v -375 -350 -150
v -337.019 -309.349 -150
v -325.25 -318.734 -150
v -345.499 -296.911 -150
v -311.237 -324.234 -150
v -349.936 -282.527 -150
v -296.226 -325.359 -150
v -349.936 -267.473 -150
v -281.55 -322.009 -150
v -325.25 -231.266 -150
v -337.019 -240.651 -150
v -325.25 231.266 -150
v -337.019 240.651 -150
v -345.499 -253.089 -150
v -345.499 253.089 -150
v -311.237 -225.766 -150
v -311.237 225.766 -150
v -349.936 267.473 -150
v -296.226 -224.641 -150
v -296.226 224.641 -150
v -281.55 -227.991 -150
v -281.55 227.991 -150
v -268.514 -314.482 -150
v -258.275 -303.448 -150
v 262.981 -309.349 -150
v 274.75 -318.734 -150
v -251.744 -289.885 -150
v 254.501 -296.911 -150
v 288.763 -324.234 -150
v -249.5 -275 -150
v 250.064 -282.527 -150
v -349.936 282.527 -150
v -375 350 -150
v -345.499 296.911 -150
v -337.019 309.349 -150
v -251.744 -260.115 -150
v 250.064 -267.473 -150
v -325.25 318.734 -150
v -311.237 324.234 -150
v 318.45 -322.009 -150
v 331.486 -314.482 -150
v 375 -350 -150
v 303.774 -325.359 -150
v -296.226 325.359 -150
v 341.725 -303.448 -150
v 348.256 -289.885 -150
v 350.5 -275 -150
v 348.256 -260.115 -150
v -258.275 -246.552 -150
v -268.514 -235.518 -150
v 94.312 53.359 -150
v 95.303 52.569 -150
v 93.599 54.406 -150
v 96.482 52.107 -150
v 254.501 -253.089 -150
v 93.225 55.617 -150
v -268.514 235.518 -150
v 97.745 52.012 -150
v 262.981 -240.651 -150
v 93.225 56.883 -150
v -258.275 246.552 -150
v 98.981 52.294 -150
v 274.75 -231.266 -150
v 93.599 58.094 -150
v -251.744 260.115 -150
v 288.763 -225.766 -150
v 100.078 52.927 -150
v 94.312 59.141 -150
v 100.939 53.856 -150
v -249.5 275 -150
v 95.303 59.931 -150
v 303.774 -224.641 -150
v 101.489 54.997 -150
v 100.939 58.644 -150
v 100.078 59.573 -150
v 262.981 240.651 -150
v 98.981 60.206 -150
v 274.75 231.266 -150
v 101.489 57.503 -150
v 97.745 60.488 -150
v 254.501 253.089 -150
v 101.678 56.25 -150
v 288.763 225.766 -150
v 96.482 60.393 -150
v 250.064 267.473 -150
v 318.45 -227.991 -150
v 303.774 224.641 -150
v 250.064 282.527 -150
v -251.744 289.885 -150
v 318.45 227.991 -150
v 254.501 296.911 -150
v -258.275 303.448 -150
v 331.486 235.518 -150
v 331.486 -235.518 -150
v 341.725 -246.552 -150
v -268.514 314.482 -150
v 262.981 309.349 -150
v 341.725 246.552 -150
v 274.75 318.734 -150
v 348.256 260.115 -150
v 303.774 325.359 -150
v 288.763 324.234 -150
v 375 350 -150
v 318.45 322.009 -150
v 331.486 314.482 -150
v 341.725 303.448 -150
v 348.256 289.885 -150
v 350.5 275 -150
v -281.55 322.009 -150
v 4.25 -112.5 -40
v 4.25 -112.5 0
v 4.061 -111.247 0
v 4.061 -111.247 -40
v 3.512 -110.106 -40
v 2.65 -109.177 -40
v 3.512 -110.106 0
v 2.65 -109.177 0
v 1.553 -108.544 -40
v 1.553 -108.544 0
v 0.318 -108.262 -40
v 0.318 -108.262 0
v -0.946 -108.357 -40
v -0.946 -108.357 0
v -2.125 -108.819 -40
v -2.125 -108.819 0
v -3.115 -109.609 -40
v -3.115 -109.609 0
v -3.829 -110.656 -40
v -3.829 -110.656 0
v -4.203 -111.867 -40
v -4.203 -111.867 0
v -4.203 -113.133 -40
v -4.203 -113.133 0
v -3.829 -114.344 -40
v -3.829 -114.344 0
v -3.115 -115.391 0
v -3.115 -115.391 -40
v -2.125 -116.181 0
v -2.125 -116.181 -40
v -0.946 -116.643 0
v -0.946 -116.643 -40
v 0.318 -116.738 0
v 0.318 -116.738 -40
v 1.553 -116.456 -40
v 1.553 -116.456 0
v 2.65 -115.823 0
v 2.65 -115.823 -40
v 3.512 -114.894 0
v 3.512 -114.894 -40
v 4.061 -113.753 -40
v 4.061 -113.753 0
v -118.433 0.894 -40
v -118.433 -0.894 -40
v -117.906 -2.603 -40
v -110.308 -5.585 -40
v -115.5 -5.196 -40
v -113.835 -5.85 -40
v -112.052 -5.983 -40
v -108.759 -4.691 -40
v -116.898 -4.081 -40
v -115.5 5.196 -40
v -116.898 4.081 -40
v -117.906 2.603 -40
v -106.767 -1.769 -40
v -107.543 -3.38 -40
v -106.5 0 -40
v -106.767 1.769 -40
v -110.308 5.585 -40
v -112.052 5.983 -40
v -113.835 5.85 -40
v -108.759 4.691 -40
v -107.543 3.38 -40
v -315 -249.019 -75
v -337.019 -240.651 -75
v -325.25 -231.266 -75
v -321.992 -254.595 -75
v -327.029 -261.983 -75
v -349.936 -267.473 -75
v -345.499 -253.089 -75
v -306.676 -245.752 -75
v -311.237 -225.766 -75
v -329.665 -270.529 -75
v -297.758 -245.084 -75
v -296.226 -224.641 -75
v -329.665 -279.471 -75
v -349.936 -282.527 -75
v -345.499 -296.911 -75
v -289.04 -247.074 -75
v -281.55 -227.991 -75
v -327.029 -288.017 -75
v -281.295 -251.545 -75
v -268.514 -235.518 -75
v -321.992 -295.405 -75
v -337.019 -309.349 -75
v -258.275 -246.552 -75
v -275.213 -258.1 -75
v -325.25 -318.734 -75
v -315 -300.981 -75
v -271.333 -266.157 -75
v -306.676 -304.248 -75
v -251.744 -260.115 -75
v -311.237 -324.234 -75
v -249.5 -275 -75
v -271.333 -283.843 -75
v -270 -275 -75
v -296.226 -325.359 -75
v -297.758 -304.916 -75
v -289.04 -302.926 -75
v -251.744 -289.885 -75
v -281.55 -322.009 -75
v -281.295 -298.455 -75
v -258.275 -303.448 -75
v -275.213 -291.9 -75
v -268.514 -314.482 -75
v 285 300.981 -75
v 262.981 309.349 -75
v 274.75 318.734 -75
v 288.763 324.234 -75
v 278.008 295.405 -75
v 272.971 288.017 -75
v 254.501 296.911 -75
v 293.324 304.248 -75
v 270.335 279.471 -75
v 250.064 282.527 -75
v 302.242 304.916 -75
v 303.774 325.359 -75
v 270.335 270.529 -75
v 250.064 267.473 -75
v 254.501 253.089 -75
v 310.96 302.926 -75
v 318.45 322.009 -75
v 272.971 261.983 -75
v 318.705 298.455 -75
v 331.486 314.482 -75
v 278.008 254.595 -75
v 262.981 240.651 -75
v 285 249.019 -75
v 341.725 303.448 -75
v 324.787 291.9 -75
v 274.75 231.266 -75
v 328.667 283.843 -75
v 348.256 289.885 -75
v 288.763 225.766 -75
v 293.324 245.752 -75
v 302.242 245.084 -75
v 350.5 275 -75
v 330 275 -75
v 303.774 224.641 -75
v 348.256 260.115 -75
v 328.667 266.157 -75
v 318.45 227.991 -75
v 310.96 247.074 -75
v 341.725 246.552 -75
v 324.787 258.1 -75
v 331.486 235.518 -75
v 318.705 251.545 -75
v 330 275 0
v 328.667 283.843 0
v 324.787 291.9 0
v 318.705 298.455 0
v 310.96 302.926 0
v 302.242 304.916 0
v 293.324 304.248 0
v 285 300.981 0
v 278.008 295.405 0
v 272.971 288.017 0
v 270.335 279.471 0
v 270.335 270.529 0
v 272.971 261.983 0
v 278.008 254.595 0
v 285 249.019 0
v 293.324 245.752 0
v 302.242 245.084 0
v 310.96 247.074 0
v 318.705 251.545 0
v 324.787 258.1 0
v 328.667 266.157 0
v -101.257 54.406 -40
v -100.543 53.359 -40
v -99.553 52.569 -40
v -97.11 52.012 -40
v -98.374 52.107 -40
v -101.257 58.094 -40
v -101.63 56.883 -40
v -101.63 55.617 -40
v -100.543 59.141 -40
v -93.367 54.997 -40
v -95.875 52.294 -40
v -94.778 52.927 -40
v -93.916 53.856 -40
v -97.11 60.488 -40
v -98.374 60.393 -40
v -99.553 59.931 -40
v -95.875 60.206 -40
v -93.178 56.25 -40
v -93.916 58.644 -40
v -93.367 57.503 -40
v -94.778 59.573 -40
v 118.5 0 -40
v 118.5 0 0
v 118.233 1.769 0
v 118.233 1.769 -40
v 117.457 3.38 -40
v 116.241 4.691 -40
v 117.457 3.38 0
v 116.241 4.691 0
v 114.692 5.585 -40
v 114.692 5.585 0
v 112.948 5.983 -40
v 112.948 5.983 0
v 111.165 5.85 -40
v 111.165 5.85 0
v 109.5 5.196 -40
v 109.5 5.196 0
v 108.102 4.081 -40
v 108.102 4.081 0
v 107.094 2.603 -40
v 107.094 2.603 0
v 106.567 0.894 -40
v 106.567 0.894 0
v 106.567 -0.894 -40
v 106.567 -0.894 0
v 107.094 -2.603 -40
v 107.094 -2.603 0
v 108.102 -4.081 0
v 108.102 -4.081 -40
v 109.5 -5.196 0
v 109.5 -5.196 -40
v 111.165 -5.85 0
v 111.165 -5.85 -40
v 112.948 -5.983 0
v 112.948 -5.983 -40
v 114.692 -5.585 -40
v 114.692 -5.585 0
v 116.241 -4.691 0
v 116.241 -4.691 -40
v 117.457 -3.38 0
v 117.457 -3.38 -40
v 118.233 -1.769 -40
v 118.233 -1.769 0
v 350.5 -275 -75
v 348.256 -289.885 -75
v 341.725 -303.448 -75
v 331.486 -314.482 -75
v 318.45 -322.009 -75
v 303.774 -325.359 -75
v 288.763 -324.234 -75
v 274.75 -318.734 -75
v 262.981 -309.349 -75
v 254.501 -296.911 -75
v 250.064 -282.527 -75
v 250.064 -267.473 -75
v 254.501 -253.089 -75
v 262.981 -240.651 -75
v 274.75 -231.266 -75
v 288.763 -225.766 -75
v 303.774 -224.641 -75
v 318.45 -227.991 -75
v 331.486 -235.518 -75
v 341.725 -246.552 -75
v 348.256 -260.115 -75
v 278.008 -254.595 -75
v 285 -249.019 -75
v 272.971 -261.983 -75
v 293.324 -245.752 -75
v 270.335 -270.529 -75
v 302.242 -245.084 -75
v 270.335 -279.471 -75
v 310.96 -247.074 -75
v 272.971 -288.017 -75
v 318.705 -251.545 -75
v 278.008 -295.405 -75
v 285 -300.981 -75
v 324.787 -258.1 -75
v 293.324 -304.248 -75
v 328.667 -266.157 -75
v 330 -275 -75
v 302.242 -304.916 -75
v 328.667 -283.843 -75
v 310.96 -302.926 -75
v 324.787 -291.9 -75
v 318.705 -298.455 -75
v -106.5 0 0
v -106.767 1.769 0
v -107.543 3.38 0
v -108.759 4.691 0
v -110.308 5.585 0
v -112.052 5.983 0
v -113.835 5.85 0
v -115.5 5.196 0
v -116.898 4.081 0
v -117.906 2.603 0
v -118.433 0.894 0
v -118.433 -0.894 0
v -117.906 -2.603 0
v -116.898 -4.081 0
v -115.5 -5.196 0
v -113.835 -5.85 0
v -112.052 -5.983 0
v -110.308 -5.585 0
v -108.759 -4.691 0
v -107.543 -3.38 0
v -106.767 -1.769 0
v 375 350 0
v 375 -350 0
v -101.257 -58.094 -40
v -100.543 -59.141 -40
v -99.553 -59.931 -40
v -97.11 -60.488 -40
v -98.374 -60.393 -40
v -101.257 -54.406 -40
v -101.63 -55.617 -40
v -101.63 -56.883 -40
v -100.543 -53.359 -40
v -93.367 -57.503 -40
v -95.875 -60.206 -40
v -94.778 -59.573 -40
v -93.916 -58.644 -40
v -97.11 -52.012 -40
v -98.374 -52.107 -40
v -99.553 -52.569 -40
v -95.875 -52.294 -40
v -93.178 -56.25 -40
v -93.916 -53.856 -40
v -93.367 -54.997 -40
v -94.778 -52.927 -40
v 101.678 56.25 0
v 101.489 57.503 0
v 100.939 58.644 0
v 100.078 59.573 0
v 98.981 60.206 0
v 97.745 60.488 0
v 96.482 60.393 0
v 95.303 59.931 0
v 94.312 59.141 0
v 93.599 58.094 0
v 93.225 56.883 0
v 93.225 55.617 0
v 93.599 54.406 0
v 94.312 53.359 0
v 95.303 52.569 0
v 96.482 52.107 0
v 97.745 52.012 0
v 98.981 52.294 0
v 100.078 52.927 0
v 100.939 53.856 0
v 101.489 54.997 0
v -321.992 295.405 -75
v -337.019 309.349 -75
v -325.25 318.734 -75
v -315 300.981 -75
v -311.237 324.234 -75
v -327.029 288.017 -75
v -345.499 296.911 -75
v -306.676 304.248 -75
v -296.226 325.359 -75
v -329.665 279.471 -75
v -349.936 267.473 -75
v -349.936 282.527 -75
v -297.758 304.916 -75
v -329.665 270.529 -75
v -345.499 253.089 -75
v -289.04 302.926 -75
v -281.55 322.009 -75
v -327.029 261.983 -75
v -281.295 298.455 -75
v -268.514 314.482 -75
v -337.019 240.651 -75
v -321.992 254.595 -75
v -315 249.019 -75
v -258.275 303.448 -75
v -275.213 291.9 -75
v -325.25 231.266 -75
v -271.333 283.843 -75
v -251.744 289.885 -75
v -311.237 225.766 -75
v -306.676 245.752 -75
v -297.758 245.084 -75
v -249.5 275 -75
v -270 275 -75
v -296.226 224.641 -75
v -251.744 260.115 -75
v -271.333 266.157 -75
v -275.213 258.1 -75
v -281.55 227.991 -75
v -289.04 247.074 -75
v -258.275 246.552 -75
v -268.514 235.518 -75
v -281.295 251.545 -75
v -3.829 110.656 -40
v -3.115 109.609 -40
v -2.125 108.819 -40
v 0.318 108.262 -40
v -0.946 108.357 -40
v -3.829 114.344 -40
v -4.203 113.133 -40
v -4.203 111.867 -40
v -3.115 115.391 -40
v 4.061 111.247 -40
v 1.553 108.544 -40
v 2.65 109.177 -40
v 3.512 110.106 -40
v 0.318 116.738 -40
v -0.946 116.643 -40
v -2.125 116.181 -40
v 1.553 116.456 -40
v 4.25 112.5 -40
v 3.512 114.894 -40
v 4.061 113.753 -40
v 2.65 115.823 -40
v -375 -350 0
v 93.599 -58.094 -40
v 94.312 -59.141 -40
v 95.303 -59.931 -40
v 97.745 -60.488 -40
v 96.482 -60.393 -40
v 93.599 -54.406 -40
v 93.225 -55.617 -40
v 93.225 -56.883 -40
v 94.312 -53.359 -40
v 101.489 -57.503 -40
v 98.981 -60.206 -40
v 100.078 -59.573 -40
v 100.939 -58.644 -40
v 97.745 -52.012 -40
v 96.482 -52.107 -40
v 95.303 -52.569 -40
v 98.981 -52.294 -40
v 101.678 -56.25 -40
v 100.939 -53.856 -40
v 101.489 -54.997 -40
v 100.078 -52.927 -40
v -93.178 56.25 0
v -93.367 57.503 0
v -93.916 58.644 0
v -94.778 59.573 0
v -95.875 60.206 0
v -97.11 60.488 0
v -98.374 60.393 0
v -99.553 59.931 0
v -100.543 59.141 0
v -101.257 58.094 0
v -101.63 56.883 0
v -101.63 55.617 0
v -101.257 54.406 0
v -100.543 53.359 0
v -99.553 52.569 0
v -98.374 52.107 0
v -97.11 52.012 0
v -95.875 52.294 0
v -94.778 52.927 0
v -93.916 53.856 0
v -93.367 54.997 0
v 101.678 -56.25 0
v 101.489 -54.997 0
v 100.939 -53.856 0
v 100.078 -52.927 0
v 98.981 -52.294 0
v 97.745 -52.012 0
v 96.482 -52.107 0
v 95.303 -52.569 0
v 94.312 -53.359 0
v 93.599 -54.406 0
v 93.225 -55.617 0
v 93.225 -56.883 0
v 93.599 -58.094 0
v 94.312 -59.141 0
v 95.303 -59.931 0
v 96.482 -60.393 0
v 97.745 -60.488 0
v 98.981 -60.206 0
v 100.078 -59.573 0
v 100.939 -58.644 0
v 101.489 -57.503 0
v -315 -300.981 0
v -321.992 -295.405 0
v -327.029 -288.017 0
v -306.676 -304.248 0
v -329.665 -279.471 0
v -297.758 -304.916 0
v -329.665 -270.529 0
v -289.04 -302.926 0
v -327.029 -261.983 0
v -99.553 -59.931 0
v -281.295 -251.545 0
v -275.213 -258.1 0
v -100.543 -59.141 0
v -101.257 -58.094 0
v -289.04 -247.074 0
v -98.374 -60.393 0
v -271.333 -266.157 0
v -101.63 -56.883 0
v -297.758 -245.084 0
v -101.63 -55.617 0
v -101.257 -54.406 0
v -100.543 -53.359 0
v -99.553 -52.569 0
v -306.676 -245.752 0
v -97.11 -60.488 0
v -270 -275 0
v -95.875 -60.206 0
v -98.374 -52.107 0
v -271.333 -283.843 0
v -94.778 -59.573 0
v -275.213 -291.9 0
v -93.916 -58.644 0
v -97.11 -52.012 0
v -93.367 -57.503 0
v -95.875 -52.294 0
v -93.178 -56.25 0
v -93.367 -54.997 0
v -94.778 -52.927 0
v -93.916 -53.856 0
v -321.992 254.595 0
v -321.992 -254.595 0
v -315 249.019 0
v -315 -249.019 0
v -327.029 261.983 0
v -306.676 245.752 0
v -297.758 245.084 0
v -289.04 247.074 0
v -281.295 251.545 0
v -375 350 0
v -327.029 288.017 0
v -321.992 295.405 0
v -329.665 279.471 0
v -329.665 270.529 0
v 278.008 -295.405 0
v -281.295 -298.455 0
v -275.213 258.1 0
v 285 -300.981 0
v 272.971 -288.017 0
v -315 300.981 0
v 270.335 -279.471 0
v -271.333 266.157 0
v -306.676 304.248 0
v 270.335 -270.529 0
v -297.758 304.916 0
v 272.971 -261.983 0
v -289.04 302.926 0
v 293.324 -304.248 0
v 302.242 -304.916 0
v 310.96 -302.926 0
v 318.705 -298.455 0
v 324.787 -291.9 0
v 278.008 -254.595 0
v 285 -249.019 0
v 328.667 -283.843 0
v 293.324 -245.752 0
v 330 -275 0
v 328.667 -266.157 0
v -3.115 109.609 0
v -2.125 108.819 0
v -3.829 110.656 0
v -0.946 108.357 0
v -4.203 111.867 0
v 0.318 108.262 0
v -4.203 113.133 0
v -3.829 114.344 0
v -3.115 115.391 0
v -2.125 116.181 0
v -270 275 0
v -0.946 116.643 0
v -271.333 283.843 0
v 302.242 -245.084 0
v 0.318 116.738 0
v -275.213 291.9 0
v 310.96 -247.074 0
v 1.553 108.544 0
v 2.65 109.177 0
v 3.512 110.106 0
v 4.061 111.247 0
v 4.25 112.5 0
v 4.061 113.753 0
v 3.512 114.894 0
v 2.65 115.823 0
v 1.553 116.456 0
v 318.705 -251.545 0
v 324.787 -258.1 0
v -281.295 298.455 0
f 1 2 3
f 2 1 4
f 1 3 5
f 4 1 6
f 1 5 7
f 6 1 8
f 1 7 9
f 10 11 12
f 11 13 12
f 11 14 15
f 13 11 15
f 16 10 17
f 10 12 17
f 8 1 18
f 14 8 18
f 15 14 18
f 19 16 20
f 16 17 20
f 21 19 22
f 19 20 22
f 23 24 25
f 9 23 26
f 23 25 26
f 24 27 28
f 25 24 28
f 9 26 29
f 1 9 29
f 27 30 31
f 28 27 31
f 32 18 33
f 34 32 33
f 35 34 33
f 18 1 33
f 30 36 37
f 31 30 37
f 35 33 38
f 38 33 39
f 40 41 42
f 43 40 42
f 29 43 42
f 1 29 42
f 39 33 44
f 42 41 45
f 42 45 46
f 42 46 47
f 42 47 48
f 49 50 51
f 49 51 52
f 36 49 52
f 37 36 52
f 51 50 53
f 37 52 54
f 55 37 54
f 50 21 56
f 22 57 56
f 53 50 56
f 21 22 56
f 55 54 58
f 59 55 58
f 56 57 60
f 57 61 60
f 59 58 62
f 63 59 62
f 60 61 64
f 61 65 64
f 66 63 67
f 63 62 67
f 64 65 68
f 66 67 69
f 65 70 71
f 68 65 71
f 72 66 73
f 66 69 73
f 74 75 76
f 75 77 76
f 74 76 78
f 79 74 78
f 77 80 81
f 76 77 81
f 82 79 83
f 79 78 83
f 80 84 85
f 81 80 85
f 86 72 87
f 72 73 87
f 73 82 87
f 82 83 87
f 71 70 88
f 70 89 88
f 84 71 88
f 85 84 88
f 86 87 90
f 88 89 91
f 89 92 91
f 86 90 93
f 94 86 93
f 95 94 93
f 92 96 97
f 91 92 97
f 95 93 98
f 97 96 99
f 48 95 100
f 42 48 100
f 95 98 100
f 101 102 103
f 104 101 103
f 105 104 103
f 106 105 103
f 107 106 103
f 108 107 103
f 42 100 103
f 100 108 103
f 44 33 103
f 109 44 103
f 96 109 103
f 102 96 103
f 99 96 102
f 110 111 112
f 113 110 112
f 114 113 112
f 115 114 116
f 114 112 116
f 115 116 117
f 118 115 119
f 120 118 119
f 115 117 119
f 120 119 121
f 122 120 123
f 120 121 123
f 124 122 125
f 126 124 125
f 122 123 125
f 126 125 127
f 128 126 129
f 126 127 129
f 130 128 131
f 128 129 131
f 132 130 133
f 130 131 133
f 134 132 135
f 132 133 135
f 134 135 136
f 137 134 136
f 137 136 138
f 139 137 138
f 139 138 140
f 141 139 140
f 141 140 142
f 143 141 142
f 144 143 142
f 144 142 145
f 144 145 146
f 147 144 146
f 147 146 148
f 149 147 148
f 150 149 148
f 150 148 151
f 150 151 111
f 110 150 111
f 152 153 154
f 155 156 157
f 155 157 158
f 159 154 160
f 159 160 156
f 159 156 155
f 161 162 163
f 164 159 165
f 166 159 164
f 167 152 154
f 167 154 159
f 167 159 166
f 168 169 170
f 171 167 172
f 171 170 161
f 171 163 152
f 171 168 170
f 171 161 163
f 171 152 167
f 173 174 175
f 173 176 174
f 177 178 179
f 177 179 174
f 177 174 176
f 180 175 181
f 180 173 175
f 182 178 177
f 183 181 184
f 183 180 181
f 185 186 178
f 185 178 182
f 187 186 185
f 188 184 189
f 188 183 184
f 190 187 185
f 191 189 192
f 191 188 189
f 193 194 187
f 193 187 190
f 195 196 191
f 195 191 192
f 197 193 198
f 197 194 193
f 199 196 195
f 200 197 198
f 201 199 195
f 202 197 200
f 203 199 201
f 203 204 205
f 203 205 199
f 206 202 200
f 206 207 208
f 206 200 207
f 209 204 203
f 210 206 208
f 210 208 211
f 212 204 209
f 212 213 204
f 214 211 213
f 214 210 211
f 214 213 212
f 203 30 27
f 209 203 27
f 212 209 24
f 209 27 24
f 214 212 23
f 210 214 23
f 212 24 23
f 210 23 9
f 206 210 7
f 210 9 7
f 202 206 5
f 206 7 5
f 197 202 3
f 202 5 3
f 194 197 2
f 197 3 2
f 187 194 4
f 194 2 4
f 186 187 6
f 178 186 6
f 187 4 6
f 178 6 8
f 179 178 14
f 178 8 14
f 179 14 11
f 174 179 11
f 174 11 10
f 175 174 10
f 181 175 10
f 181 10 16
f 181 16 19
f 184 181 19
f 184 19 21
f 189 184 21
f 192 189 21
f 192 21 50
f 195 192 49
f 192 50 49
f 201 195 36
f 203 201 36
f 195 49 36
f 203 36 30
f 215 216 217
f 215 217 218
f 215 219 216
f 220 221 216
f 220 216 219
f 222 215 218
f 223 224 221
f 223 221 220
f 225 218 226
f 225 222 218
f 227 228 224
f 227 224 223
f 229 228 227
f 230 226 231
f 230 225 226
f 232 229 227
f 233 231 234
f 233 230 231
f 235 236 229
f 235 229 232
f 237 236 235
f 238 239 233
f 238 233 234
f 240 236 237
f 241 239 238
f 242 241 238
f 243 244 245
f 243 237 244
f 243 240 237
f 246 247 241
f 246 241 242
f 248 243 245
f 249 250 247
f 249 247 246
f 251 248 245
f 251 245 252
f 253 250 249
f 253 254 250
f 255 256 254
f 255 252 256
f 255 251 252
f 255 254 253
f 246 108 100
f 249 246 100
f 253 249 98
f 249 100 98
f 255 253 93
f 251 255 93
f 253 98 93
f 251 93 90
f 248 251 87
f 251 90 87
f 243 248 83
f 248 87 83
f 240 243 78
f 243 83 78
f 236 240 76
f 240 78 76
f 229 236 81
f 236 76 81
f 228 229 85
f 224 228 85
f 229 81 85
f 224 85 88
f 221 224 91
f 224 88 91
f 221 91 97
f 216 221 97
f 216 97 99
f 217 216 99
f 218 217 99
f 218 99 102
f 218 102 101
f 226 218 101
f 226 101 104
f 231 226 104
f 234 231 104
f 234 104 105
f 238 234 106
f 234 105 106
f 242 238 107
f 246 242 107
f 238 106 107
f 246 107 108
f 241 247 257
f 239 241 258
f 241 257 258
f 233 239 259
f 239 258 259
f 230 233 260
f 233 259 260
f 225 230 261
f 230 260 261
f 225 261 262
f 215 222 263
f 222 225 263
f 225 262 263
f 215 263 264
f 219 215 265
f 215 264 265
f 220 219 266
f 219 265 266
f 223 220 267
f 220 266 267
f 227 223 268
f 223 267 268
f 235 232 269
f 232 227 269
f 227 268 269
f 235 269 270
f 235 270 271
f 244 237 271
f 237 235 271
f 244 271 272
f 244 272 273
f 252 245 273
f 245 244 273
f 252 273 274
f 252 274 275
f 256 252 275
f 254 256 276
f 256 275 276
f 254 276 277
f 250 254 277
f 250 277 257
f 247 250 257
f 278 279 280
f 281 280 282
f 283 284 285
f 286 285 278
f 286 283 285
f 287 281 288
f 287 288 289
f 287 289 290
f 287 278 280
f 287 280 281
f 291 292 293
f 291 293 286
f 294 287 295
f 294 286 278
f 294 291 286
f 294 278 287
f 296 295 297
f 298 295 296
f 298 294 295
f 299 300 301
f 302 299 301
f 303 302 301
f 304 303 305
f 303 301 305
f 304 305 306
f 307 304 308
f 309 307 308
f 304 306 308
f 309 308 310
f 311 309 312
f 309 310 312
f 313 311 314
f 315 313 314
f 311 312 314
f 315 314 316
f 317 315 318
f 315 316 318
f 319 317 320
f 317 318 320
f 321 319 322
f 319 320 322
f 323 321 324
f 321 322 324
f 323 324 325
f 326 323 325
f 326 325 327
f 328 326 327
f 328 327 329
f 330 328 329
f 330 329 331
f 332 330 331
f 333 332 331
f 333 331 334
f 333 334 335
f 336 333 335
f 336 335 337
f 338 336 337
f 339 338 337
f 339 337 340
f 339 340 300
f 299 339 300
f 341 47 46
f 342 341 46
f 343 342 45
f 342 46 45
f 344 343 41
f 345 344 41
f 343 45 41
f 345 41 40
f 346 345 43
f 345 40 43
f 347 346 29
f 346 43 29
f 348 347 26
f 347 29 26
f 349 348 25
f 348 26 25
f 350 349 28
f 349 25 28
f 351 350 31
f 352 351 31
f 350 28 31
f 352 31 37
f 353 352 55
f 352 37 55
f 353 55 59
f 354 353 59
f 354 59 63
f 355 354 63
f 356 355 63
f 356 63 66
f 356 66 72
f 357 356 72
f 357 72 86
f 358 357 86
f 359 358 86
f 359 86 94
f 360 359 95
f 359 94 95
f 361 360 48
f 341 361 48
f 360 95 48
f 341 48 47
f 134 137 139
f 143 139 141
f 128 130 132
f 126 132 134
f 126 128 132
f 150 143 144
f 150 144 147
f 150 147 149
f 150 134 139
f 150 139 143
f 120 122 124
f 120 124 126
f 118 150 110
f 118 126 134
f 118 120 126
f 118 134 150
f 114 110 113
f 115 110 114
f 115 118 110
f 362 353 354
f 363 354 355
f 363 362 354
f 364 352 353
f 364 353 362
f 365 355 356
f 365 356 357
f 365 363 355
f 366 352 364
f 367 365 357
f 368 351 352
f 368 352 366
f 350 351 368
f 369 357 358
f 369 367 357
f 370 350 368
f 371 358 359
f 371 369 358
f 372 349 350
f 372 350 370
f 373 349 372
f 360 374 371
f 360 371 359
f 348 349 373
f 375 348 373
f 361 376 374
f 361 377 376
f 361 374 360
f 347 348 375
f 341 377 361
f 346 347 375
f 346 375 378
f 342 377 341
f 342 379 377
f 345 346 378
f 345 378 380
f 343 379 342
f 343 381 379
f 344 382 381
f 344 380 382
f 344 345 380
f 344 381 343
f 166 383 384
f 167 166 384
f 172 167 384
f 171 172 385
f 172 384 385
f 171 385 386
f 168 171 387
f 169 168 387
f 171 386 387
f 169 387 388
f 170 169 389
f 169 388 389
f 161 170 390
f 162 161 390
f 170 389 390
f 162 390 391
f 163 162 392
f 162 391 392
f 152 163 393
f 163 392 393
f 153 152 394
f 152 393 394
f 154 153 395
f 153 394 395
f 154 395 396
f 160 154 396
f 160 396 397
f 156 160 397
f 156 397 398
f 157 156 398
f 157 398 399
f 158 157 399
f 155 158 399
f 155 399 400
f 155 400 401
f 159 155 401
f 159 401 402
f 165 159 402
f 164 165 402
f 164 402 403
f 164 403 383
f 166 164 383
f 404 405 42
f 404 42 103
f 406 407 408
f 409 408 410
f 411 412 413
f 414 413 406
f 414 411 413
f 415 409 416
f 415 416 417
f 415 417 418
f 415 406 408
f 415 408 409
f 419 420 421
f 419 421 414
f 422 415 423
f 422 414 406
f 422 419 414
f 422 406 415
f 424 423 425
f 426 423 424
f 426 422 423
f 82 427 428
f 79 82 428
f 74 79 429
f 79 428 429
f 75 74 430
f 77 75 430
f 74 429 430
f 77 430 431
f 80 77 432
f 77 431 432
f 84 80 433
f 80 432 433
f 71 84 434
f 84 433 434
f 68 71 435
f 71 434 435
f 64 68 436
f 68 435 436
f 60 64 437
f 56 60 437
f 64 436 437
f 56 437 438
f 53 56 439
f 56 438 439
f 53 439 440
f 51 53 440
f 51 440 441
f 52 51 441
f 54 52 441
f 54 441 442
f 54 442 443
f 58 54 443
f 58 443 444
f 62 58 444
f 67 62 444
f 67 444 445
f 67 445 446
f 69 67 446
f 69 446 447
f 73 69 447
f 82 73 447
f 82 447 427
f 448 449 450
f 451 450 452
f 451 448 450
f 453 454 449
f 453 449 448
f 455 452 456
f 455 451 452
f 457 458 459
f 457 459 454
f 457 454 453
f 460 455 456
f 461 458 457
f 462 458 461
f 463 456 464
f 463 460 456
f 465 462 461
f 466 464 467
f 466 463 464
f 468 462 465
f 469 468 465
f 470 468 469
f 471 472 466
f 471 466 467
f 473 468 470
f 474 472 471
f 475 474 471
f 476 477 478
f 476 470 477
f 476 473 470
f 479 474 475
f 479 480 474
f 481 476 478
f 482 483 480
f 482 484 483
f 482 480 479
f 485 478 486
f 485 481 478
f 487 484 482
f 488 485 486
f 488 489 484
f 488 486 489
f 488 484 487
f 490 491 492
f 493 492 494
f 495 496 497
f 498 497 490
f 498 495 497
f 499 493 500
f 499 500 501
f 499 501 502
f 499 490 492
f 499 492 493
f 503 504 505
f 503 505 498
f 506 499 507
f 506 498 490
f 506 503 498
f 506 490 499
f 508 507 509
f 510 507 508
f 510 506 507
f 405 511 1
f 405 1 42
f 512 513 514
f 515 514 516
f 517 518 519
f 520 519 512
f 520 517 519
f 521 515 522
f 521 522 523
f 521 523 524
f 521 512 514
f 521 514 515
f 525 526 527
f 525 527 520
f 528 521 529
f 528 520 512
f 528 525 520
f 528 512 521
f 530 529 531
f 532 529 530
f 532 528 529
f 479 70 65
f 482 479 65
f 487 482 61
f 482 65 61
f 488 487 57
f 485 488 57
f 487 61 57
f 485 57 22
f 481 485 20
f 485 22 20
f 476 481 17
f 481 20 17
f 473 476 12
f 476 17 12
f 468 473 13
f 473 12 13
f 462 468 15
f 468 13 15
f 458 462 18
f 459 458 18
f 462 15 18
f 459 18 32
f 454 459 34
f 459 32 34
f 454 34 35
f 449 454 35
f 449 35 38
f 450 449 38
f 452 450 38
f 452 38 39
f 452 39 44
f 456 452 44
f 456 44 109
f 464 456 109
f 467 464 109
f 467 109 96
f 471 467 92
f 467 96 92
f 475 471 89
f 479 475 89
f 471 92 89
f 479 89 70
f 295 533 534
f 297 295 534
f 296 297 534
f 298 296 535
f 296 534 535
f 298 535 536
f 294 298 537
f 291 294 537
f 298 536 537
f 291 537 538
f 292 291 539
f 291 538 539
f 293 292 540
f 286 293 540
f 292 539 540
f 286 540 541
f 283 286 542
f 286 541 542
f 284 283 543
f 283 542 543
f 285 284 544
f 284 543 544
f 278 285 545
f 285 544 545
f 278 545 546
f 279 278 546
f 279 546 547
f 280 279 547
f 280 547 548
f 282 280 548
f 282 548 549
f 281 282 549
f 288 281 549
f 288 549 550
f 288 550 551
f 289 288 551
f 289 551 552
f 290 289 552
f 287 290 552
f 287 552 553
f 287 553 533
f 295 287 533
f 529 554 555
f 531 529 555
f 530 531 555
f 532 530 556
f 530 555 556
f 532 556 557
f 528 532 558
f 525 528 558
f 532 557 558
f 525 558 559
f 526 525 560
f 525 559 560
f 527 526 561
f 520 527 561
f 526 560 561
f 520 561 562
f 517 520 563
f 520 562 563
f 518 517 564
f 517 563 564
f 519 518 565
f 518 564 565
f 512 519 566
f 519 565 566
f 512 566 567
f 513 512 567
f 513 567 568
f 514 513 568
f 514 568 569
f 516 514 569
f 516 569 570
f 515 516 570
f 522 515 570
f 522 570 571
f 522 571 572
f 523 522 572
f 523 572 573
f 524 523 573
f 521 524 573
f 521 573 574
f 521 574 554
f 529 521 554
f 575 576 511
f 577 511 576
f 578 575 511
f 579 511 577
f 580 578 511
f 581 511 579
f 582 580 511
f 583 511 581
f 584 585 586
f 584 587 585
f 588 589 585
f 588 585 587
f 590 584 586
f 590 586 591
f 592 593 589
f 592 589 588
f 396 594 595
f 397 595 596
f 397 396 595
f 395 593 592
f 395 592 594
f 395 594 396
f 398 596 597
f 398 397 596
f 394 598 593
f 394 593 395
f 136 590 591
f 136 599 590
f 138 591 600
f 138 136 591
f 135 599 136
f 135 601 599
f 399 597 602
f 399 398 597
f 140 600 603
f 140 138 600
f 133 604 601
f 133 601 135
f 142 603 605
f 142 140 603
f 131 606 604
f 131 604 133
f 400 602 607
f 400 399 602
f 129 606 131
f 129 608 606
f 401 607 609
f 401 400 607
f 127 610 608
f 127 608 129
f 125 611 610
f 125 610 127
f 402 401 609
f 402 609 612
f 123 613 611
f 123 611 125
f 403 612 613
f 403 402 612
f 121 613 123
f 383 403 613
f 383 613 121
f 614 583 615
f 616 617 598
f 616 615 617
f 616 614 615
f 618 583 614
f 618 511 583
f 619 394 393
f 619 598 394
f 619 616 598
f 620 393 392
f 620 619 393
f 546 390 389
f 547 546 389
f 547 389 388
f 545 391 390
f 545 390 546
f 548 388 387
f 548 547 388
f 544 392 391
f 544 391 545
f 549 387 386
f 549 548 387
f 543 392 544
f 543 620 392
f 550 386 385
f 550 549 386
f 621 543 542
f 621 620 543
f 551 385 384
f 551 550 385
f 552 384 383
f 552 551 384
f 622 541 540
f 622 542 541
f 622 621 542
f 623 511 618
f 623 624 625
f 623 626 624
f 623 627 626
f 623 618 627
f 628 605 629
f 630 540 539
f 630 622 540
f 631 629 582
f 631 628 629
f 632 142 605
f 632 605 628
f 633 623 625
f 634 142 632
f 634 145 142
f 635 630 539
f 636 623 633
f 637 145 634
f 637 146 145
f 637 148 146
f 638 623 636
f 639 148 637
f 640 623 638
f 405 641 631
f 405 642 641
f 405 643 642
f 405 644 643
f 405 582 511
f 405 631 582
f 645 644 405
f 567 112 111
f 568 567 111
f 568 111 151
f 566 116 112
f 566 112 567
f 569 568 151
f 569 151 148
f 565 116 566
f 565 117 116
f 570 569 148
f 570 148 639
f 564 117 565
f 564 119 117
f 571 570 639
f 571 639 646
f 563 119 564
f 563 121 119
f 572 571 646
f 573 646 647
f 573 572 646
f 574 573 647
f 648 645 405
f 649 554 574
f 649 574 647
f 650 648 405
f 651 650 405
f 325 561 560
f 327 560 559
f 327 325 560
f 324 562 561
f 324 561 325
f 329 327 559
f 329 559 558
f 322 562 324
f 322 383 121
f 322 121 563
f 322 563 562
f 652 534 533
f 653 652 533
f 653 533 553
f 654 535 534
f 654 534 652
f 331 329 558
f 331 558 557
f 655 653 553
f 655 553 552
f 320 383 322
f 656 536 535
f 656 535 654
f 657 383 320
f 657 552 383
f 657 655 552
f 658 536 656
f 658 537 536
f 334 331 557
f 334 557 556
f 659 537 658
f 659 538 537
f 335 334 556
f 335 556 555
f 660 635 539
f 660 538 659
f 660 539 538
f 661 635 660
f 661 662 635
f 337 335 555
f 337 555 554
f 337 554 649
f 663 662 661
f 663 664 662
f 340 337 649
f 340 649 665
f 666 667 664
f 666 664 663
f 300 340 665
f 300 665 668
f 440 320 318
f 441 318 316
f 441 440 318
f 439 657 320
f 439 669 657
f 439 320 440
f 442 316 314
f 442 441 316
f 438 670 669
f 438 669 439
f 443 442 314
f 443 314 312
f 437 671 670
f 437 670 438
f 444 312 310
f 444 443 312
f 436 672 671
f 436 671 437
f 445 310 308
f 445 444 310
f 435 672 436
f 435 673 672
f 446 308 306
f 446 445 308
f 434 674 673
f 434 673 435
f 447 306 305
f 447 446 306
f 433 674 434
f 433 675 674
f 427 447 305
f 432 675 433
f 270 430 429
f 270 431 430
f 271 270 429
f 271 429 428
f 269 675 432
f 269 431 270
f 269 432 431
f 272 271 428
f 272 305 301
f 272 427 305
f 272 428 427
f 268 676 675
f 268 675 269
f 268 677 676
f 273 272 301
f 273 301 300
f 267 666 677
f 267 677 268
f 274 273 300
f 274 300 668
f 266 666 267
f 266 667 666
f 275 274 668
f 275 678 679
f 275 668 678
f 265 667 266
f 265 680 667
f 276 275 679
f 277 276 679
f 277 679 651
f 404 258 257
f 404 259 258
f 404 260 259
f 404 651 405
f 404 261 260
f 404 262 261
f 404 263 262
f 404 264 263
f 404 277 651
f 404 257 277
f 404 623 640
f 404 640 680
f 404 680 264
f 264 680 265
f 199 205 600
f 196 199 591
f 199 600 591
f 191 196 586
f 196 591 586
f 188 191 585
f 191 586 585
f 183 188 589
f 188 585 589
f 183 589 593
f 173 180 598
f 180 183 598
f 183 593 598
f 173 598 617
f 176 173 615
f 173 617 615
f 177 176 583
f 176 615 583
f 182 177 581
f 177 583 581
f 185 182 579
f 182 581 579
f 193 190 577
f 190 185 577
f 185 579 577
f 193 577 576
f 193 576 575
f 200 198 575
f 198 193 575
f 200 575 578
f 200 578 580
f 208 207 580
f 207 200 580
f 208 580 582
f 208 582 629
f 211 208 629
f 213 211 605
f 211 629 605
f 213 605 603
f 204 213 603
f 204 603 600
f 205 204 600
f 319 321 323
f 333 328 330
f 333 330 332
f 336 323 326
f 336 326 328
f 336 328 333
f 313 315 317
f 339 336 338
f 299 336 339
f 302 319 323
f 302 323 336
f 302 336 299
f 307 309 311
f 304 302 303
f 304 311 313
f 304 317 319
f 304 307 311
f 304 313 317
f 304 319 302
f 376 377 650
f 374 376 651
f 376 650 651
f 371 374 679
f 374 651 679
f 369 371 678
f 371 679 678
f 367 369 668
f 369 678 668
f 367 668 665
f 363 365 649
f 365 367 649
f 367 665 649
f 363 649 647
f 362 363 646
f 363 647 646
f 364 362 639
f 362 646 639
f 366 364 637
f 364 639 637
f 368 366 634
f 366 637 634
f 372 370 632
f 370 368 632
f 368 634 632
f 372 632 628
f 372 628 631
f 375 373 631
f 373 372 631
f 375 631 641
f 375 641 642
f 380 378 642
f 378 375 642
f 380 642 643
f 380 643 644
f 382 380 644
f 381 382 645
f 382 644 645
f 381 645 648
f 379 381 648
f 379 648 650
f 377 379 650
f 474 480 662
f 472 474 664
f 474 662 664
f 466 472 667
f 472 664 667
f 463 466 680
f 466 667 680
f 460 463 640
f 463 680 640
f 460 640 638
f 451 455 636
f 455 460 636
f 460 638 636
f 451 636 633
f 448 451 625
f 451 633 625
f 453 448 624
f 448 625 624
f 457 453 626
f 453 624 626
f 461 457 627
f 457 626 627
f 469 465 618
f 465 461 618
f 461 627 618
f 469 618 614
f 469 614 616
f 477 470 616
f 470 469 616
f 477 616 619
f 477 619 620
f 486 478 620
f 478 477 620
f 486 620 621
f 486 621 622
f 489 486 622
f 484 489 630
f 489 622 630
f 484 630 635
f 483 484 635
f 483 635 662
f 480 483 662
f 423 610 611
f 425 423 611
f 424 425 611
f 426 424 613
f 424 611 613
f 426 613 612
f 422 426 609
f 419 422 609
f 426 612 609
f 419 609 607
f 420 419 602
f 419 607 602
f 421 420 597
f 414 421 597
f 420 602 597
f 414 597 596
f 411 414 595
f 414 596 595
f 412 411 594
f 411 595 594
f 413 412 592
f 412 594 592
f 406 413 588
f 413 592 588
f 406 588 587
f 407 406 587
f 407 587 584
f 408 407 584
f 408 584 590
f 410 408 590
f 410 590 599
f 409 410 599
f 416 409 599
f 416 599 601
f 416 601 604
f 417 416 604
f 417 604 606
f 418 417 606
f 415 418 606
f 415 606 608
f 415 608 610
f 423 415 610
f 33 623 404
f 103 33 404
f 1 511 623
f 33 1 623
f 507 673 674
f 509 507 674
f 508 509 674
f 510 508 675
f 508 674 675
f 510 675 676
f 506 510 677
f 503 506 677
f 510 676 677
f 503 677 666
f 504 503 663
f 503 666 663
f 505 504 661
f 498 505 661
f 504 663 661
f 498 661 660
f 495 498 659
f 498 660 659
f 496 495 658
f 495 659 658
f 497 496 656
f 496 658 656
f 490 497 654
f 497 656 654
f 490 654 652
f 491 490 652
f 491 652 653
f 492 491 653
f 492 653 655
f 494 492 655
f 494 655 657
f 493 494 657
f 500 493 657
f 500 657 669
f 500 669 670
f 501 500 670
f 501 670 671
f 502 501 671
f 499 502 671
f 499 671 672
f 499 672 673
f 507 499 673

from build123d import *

# Parameters (mm, degrees)
F0_W     = 750
F0_H     = 700
F0_R     = 30
F0_R_2   = 4.25
F0_R_3   = 6
F1_DEPTH = 150
F2_DEPTH = 130
F3_DEPTH = 40
F6_R     = 50.5
F6_R_2   = 30
F7_DEPTH = 75


with BuildPart() as f1:
    # F0 (on Top) → F1 (new body)
    with BuildSketch(Plane.XY):
        Rectangle(F0_W, F0_H)
        with Locations((-300, -275)):
            Circle(F0_R, mode=Mode.SUBTRACT)
        with Locations((-97.427858, -56.25)):
            Circle(F0_R_2, mode=Mode.SUBTRACT)
        with Locations((300, -275)):
            Circle(F0_R, mode=Mode.SUBTRACT)
        with Locations((0, -112.5)):
            Circle(F0_R_2, mode=Mode.SUBTRACT)
        with Locations((97.427858, -56.25)):
            Circle(F0_R_2, mode=Mode.SUBTRACT)
        with Locations((-112.5, 0)):
            Circle(F0_R_3, mode=Mode.SUBTRACT)
        with Locations((-97.427858, 56.25)):
            Circle(F0_R_2, mode=Mode.SUBTRACT)
        with Locations((-300, 275)):
            Circle(F0_R, mode=Mode.SUBTRACT)
        with Locations((112.5, 0)):
            Circle(F0_R_3, mode=Mode.SUBTRACT)
        with Locations((97.427858, 56.25)):
            Circle(F0_R_2, mode=Mode.SUBTRACT)
        with Locations((0, 112.5)):
            Circle(F0_R_2, mode=Mode.SUBTRACT)
        with Locations((300, 275)):
            Circle(F0_R, mode=Mode.SUBTRACT)
        with Locations((-112.5, 0)):
            Circle(F0_R_3)
        with Locations((-97.427858, -56.25)):
            Circle(F0_R_2)
        with Locations((-97.427858, 56.25)):
            Circle(F0_R_2)
        with Locations((0, 112.5)):
            Circle(F0_R_2)
        with Locations((112.5, 0)):
            Circle(F0_R_3)
        with Locations((97.427858, -56.25)):
            Circle(F0_R_2)
        with Locations((0, -112.5)):
            Circle(F0_R_2)
    extrude(amount=-F1_DEPTH)

    # F0 (on Top) → F3 (cut)
    with BuildSketch(Plane.XY):
        with Locations((-112.5, 0)):
            Circle(F0_R_3)
        with Locations((-97.427858, 56.25)):
            Circle(F0_R_2)
        with Locations((0, 112.5)):
            Circle(F0_R_2)
        with Locations((97.427858, 56.25)):
            Circle(F0_R_2)
        with Locations((112.5, 0)):
            Circle(F0_R_3)
        with Locations((97.427858, -56.25)):
            Circle(F0_R_2)
        with Locations((0, -112.5)):
            Circle(F0_R_2)
        with Locations((-97.427858, -56.25)):
            Circle(F0_R_2)
    extrude(amount=-F3_DEPTH, mode=Mode.SUBTRACT)


with BuildPart() as f2:
    # F0 (on Top) → F2 (new body)
    with BuildSketch(Plane.XY):
        Rectangle(F0_W, F0_H)
        with Locations((-300, -275)):
            Circle(F0_R, mode=Mode.SUBTRACT)
        with Locations((-97.427858, -56.25)):
            Circle(F0_R_2, mode=Mode.SUBTRACT)
        with Locations((300, -275)):
            Circle(F0_R, mode=Mode.SUBTRACT)
        with Locations((0, -112.5)):
            Circle(F0_R_2, mode=Mode.SUBTRACT)
        with Locations((97.427858, -56.25)):
            Circle(F0_R_2, mode=Mode.SUBTRACT)
        with Locations((-112.5, 0)):
            Circle(F0_R_3, mode=Mode.SUBTRACT)
        with Locations((-97.427858, 56.25)):
            Circle(F0_R_2, mode=Mode.SUBTRACT)
        with Locations((-300, 275)):
            Circle(F0_R, mode=Mode.SUBTRACT)
        with Locations((112.5, 0)):
            Circle(F0_R_3, mode=Mode.SUBTRACT)
        with Locations((97.427858, 56.25)):
            Circle(F0_R_2, mode=Mode.SUBTRACT)
        with Locations((0, 112.5)):
            Circle(F0_R_2, mode=Mode.SUBTRACT)
        with Locations((300, 275)):
            Circle(F0_R, mode=Mode.SUBTRACT)
    extrude(amount=-F2_DEPTH)


with BuildPart() as f2_1:
    # F4: moved
    add(f2.part.moved(Location((0, 0, -20))))

    # F5: union F1
    add(f1.part)

    # F6 (on face) → F7 (cut)
    with BuildSketch(Plane(origin=(0, 0, -150), x_dir=(1, 0, 0), z_dir=(0, 0, -1))):
        with Locations((-300, 275)):
            Circle(F6_R)
        with Locations((-300, 275)):
            Circle(F6_R_2, mode=Mode.SUBTRACT)
        with Locations((-300, -275)):
            Circle(F6_R)
        with Locations((-300, -275)):
            Circle(F6_R_2, mode=Mode.SUBTRACT)
        with Locations((300, -275)):
            Circle(F6_R)
        with Locations((300, -275)):
            Circle(F6_R_2, mode=Mode.SUBTRACT)
        with Locations((300, 275)):
            Circle(F6_R)
        with Locations((300, 275)):
            Circle(F6_R_2, mode=Mode.SUBTRACT)
    extrude(amount=-F7_DEPTH, mode=Mode.SUBTRACT)


solid = f2_1.part
